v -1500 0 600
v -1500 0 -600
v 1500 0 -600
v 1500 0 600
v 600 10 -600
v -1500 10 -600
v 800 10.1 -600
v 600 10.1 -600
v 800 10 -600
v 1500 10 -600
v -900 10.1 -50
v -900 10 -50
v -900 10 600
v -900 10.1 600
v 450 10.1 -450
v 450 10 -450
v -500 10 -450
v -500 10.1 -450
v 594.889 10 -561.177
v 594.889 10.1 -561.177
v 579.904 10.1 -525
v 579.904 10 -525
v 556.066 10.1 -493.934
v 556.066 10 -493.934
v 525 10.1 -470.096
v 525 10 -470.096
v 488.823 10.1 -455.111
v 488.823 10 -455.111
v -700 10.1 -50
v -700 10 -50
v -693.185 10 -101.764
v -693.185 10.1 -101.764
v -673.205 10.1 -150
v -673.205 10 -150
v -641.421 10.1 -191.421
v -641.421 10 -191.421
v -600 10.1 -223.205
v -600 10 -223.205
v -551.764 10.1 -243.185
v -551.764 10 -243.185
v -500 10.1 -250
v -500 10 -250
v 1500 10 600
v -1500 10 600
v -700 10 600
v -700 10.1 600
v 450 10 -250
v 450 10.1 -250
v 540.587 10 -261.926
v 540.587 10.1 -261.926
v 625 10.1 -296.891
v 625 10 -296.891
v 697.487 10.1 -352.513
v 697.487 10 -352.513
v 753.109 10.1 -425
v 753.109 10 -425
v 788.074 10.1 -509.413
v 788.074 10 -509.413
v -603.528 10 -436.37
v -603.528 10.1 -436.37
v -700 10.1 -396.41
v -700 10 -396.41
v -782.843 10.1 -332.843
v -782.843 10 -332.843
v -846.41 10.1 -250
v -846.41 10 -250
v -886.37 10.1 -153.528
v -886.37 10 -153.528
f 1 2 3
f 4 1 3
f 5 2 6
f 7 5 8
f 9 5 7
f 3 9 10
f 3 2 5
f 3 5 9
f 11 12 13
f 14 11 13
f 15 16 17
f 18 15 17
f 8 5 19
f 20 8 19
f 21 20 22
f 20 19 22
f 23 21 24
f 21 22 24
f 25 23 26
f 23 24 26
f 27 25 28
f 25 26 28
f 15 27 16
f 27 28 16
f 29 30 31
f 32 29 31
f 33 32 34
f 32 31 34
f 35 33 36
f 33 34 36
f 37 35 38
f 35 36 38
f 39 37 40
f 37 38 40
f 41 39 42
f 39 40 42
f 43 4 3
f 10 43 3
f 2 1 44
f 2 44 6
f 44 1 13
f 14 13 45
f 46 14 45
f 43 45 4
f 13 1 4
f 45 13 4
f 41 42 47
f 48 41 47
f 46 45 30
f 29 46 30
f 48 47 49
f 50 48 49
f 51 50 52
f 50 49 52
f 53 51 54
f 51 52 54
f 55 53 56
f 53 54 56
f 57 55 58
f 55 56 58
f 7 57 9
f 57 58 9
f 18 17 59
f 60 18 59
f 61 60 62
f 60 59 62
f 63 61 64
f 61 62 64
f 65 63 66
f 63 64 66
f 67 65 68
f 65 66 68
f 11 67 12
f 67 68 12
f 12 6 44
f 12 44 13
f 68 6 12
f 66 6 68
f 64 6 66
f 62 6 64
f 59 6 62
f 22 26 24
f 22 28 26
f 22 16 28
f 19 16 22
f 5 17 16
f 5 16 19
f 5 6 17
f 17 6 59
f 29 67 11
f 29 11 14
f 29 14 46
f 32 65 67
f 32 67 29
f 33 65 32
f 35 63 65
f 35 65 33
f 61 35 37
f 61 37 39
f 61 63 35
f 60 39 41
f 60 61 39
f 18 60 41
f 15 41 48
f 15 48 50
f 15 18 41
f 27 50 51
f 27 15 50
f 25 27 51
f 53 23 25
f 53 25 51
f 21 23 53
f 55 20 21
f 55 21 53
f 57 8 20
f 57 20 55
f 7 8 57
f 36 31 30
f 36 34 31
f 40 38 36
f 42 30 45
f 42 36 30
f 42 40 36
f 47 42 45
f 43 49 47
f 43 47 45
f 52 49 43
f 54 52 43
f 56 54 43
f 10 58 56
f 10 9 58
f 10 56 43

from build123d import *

# Parameters (mm, degrees)
SKIZZE1_W   = 3000
SKIZZE1_H   = 1200
BODEN_DEPTH = 10
BAHN_DEPTH  = 0.1


with BuildPart() as part:
    # Skizze1 → Boden (new body)
    with BuildSketch(Plane(origin=(0, 0, 0), x_dir=(1, 0, 0), z_dir=(0, 1, 0))):
        Rectangle(SKIZZE1_W, SKIZZE1_H)
    extrude(amount=BODEN_DEPTH)

    # Skizze2 → Bahn (add)
    with BuildSketch(Plane(origin=(0, 10, 0), x_dir=(1, 0, 0), z_dir=(0, 1, 0))):
        with BuildLine():
            Line((-700, -600), (-700, 50))
            ThreePointArc((-700, 50), (-641.421356237, 191.421356237), (-500, 250))
            Line((-500, 250), (450, 250))
            ThreePointArc((450, 250), (697.487373415, 352.512626585), (800, 600))
            Line((800, 600), (600, 600))
            ThreePointArc((600, 600), (556.066017178, 493.933982822), (450, 450))
            Line((450, 450), (-500, 450))
            ThreePointArc((-500, 450), (-782.842712475, 332.842712475), (-900, 50))
            Line((-900, 50), (-900, -600))
            Line((-900, -600), (-700, -600))
        make_face()
    extrude(amount=BAHN_DEPTH)


solid = part.part
